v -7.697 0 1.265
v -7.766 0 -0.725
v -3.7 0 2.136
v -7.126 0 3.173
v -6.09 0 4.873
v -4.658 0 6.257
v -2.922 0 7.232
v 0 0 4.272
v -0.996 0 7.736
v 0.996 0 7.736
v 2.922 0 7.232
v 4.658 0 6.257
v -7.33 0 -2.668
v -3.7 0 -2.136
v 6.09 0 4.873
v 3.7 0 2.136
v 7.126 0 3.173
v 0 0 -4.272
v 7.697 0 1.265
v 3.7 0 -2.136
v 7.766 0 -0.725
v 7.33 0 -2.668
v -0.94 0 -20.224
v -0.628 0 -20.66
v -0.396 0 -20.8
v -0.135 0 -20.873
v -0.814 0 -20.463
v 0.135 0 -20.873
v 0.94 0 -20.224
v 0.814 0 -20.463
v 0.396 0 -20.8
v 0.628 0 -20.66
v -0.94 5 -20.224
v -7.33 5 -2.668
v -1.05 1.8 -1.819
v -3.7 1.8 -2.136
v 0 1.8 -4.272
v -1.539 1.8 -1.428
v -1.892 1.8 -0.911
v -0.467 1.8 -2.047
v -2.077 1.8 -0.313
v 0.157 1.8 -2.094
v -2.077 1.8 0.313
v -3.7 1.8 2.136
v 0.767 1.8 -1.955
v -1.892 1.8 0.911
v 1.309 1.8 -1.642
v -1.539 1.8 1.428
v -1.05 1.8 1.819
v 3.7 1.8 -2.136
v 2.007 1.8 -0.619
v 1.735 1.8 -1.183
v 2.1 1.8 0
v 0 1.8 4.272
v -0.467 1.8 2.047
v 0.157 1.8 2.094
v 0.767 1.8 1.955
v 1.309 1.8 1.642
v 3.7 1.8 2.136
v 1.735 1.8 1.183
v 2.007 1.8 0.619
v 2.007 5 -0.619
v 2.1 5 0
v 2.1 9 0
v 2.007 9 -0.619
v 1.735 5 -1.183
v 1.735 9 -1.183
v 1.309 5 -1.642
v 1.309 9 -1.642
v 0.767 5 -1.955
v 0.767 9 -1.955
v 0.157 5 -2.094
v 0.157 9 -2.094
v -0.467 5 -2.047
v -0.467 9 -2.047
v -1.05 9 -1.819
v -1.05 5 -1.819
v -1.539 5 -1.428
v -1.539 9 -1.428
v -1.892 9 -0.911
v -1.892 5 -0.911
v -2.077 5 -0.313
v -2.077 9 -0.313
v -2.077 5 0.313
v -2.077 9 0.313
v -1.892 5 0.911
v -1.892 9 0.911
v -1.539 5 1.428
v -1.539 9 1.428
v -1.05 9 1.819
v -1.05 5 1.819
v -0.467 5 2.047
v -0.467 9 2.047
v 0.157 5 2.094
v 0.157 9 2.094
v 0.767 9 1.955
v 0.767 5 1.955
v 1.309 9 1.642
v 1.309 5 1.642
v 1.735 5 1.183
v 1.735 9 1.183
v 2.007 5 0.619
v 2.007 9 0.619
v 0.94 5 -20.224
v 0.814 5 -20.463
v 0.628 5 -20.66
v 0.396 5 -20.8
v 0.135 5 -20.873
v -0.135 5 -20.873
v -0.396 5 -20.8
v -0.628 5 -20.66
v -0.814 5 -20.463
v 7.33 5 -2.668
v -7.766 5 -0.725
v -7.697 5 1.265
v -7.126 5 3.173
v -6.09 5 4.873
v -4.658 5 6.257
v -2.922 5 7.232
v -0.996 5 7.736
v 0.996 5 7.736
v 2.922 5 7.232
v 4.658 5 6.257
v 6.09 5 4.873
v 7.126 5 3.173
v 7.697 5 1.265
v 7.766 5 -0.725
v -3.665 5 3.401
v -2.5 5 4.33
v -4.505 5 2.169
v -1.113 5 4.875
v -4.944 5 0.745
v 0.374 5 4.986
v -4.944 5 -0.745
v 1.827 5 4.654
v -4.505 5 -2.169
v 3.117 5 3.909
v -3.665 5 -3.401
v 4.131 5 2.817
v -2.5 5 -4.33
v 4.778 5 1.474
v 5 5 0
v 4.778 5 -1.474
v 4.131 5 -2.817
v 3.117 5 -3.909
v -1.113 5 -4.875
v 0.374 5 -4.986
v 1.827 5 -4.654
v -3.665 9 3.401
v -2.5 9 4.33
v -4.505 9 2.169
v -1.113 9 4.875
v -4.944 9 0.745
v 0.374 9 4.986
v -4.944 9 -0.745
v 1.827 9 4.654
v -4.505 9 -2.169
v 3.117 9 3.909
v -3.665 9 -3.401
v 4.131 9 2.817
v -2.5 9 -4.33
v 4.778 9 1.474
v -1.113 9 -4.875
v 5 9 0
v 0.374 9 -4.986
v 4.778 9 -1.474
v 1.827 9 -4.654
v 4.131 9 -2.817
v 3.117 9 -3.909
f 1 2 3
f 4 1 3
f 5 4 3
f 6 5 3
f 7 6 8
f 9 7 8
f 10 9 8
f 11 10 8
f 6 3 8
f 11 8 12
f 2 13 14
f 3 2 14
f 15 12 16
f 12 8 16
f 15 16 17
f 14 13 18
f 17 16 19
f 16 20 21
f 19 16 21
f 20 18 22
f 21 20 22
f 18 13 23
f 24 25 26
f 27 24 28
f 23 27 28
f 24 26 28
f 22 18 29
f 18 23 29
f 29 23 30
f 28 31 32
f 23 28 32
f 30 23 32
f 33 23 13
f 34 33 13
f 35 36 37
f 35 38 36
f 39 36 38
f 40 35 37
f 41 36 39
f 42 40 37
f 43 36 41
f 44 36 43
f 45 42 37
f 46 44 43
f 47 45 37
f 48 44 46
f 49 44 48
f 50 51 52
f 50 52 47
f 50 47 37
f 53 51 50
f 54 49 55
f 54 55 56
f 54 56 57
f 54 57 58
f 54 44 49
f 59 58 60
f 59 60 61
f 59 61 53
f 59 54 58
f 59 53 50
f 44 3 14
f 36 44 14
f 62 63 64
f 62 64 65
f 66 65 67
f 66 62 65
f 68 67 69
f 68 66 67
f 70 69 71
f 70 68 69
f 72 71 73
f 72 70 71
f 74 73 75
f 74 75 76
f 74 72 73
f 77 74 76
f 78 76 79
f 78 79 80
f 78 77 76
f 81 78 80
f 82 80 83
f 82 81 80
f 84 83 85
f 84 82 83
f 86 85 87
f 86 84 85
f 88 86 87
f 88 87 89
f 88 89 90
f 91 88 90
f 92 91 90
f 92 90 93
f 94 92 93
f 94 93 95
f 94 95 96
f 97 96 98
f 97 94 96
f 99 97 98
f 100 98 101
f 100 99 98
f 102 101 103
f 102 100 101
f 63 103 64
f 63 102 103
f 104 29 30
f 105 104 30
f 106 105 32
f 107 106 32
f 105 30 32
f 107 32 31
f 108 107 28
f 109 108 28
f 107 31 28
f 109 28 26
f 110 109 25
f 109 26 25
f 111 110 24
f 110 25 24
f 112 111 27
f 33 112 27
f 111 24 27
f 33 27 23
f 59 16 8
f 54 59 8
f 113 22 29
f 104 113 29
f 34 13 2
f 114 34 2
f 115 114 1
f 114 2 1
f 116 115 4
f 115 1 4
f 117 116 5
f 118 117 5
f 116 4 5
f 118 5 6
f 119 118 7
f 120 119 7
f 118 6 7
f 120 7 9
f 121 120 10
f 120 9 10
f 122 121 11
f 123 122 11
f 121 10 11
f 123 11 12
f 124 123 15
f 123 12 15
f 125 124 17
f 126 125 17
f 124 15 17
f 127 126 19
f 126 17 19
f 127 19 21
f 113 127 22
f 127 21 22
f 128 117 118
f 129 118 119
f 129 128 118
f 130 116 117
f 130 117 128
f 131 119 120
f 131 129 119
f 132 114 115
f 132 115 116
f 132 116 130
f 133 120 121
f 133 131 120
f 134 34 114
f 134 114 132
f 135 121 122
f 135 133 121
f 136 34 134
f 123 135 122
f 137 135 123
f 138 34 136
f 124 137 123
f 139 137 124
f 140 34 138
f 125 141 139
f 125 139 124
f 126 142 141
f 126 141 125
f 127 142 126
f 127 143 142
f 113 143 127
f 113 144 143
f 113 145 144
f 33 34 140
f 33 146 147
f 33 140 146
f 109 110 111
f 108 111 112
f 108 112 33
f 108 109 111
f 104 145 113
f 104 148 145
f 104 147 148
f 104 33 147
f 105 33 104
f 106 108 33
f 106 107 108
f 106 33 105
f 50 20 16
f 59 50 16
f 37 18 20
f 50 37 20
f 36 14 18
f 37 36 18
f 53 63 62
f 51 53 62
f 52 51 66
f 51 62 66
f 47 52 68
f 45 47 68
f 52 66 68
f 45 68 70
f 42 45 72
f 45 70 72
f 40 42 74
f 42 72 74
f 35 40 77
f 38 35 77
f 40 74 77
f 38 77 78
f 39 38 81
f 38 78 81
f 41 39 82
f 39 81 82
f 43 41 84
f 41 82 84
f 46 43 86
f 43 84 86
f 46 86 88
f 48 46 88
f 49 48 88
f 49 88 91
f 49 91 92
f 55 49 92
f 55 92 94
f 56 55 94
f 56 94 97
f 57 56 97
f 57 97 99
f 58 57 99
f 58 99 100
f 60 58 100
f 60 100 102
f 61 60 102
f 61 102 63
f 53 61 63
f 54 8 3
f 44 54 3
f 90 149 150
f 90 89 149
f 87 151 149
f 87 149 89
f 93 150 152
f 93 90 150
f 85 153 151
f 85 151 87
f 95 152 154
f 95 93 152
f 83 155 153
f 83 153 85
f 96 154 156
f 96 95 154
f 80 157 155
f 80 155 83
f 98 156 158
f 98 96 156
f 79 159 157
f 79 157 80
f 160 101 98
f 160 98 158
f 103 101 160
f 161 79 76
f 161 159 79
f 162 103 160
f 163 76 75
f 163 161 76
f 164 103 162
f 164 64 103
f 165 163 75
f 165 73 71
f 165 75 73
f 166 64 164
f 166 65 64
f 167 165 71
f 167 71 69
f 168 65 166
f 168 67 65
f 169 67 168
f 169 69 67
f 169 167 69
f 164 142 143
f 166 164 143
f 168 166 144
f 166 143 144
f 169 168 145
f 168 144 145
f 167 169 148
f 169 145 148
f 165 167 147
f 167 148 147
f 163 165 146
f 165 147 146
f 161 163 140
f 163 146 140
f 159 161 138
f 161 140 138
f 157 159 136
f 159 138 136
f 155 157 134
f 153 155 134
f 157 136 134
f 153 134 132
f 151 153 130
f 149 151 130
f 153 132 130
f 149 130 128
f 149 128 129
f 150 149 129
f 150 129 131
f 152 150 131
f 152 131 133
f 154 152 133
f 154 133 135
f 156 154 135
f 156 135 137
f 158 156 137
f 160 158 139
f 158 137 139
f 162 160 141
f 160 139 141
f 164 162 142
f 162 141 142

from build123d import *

# Parameters (mm, degrees)
BOSS_EXTRUDE2_DEPTH = 5
CUT_EXTRUDE1_REACH  = 7
SKETCH3_R           = 2.1
CUT_EXTRUDE3_DEPTH  = 1.8
SKETCH6_R           = 5
SKETCH6_R_2         = 2.1
BOSS_EXTRUDE3_DEPTH = 4


with BuildPart() as part:
    # Sketch1 → Boss-Extrude2 (new body)
    with BuildSketch(Plane(origin=(0, 0, 0), x_dir=(1, 0, 0), z_dir=(0, 1, 0))):
        with BuildLine():
            Line((-0.939692556, 20.223890242), (-7.329602442, 2.667757118))
            ThreePointArc((-7.329602442, 2.667757118), (0, -7.8), (7.329602442, 2.667757118))
            Line((7.329602442, 2.667757118), (0.939692556, 20.223890242))
            ThreePointArc((0.939692556, 20.223890242), (0, 20.881870053), (-0.939692556, 20.223890242))
        make_face()
    extrude(amount=BOSS_EXTRUDE2_DEPTH)

    # Sketch3 → Cut-Extrude1 (cut, up to next)
    with BuildSketch(Plane(origin=(0, 5, 0), x_dir=(1, 0, 0), z_dir=(0, 1, 0)), mode=Mode.PRIVATE) as cut_extrude1_sk1:
        Circle(SKETCH3_R)
    cut_extrude1_tool1 = extrude(cut_extrude1_sk1.sketch, amount=-CUT_EXTRUDE1_REACH, mode=Mode.PRIVATE) & part.part
    add(cut_extrude1_tool1.solids().sort_by_distance((0, 5, 0))[0], mode=Mode.SUBTRACT)

    # Sketch5 → Cut-Extrude3 (cut)
    with BuildSketch(Plane.XZ):
        Polygon((0, 4.272391992), (-3.7, 2.136195996), (-3.7, -2.136195996), (0, -4.272391992), (3.7, -2.136195996), (3.7, 2.136195996), align=None)
    extrude(amount=-CUT_EXTRUDE3_DEPTH, mode=Mode.SUBTRACT)

    # Sketch6 → Boss-Extrude3 (add)
    with BuildSketch(Plane(origin=(0, 5, 0), x_dir=(1, 0, 0), z_dir=(0, 1, 0))):
        Circle(SKETCH6_R)
        Circle(SKETCH6_R_2, mode=Mode.SUBTRACT)
    extrude(amount=BOSS_EXTRUDE3_DEPTH)


solid = part.part
